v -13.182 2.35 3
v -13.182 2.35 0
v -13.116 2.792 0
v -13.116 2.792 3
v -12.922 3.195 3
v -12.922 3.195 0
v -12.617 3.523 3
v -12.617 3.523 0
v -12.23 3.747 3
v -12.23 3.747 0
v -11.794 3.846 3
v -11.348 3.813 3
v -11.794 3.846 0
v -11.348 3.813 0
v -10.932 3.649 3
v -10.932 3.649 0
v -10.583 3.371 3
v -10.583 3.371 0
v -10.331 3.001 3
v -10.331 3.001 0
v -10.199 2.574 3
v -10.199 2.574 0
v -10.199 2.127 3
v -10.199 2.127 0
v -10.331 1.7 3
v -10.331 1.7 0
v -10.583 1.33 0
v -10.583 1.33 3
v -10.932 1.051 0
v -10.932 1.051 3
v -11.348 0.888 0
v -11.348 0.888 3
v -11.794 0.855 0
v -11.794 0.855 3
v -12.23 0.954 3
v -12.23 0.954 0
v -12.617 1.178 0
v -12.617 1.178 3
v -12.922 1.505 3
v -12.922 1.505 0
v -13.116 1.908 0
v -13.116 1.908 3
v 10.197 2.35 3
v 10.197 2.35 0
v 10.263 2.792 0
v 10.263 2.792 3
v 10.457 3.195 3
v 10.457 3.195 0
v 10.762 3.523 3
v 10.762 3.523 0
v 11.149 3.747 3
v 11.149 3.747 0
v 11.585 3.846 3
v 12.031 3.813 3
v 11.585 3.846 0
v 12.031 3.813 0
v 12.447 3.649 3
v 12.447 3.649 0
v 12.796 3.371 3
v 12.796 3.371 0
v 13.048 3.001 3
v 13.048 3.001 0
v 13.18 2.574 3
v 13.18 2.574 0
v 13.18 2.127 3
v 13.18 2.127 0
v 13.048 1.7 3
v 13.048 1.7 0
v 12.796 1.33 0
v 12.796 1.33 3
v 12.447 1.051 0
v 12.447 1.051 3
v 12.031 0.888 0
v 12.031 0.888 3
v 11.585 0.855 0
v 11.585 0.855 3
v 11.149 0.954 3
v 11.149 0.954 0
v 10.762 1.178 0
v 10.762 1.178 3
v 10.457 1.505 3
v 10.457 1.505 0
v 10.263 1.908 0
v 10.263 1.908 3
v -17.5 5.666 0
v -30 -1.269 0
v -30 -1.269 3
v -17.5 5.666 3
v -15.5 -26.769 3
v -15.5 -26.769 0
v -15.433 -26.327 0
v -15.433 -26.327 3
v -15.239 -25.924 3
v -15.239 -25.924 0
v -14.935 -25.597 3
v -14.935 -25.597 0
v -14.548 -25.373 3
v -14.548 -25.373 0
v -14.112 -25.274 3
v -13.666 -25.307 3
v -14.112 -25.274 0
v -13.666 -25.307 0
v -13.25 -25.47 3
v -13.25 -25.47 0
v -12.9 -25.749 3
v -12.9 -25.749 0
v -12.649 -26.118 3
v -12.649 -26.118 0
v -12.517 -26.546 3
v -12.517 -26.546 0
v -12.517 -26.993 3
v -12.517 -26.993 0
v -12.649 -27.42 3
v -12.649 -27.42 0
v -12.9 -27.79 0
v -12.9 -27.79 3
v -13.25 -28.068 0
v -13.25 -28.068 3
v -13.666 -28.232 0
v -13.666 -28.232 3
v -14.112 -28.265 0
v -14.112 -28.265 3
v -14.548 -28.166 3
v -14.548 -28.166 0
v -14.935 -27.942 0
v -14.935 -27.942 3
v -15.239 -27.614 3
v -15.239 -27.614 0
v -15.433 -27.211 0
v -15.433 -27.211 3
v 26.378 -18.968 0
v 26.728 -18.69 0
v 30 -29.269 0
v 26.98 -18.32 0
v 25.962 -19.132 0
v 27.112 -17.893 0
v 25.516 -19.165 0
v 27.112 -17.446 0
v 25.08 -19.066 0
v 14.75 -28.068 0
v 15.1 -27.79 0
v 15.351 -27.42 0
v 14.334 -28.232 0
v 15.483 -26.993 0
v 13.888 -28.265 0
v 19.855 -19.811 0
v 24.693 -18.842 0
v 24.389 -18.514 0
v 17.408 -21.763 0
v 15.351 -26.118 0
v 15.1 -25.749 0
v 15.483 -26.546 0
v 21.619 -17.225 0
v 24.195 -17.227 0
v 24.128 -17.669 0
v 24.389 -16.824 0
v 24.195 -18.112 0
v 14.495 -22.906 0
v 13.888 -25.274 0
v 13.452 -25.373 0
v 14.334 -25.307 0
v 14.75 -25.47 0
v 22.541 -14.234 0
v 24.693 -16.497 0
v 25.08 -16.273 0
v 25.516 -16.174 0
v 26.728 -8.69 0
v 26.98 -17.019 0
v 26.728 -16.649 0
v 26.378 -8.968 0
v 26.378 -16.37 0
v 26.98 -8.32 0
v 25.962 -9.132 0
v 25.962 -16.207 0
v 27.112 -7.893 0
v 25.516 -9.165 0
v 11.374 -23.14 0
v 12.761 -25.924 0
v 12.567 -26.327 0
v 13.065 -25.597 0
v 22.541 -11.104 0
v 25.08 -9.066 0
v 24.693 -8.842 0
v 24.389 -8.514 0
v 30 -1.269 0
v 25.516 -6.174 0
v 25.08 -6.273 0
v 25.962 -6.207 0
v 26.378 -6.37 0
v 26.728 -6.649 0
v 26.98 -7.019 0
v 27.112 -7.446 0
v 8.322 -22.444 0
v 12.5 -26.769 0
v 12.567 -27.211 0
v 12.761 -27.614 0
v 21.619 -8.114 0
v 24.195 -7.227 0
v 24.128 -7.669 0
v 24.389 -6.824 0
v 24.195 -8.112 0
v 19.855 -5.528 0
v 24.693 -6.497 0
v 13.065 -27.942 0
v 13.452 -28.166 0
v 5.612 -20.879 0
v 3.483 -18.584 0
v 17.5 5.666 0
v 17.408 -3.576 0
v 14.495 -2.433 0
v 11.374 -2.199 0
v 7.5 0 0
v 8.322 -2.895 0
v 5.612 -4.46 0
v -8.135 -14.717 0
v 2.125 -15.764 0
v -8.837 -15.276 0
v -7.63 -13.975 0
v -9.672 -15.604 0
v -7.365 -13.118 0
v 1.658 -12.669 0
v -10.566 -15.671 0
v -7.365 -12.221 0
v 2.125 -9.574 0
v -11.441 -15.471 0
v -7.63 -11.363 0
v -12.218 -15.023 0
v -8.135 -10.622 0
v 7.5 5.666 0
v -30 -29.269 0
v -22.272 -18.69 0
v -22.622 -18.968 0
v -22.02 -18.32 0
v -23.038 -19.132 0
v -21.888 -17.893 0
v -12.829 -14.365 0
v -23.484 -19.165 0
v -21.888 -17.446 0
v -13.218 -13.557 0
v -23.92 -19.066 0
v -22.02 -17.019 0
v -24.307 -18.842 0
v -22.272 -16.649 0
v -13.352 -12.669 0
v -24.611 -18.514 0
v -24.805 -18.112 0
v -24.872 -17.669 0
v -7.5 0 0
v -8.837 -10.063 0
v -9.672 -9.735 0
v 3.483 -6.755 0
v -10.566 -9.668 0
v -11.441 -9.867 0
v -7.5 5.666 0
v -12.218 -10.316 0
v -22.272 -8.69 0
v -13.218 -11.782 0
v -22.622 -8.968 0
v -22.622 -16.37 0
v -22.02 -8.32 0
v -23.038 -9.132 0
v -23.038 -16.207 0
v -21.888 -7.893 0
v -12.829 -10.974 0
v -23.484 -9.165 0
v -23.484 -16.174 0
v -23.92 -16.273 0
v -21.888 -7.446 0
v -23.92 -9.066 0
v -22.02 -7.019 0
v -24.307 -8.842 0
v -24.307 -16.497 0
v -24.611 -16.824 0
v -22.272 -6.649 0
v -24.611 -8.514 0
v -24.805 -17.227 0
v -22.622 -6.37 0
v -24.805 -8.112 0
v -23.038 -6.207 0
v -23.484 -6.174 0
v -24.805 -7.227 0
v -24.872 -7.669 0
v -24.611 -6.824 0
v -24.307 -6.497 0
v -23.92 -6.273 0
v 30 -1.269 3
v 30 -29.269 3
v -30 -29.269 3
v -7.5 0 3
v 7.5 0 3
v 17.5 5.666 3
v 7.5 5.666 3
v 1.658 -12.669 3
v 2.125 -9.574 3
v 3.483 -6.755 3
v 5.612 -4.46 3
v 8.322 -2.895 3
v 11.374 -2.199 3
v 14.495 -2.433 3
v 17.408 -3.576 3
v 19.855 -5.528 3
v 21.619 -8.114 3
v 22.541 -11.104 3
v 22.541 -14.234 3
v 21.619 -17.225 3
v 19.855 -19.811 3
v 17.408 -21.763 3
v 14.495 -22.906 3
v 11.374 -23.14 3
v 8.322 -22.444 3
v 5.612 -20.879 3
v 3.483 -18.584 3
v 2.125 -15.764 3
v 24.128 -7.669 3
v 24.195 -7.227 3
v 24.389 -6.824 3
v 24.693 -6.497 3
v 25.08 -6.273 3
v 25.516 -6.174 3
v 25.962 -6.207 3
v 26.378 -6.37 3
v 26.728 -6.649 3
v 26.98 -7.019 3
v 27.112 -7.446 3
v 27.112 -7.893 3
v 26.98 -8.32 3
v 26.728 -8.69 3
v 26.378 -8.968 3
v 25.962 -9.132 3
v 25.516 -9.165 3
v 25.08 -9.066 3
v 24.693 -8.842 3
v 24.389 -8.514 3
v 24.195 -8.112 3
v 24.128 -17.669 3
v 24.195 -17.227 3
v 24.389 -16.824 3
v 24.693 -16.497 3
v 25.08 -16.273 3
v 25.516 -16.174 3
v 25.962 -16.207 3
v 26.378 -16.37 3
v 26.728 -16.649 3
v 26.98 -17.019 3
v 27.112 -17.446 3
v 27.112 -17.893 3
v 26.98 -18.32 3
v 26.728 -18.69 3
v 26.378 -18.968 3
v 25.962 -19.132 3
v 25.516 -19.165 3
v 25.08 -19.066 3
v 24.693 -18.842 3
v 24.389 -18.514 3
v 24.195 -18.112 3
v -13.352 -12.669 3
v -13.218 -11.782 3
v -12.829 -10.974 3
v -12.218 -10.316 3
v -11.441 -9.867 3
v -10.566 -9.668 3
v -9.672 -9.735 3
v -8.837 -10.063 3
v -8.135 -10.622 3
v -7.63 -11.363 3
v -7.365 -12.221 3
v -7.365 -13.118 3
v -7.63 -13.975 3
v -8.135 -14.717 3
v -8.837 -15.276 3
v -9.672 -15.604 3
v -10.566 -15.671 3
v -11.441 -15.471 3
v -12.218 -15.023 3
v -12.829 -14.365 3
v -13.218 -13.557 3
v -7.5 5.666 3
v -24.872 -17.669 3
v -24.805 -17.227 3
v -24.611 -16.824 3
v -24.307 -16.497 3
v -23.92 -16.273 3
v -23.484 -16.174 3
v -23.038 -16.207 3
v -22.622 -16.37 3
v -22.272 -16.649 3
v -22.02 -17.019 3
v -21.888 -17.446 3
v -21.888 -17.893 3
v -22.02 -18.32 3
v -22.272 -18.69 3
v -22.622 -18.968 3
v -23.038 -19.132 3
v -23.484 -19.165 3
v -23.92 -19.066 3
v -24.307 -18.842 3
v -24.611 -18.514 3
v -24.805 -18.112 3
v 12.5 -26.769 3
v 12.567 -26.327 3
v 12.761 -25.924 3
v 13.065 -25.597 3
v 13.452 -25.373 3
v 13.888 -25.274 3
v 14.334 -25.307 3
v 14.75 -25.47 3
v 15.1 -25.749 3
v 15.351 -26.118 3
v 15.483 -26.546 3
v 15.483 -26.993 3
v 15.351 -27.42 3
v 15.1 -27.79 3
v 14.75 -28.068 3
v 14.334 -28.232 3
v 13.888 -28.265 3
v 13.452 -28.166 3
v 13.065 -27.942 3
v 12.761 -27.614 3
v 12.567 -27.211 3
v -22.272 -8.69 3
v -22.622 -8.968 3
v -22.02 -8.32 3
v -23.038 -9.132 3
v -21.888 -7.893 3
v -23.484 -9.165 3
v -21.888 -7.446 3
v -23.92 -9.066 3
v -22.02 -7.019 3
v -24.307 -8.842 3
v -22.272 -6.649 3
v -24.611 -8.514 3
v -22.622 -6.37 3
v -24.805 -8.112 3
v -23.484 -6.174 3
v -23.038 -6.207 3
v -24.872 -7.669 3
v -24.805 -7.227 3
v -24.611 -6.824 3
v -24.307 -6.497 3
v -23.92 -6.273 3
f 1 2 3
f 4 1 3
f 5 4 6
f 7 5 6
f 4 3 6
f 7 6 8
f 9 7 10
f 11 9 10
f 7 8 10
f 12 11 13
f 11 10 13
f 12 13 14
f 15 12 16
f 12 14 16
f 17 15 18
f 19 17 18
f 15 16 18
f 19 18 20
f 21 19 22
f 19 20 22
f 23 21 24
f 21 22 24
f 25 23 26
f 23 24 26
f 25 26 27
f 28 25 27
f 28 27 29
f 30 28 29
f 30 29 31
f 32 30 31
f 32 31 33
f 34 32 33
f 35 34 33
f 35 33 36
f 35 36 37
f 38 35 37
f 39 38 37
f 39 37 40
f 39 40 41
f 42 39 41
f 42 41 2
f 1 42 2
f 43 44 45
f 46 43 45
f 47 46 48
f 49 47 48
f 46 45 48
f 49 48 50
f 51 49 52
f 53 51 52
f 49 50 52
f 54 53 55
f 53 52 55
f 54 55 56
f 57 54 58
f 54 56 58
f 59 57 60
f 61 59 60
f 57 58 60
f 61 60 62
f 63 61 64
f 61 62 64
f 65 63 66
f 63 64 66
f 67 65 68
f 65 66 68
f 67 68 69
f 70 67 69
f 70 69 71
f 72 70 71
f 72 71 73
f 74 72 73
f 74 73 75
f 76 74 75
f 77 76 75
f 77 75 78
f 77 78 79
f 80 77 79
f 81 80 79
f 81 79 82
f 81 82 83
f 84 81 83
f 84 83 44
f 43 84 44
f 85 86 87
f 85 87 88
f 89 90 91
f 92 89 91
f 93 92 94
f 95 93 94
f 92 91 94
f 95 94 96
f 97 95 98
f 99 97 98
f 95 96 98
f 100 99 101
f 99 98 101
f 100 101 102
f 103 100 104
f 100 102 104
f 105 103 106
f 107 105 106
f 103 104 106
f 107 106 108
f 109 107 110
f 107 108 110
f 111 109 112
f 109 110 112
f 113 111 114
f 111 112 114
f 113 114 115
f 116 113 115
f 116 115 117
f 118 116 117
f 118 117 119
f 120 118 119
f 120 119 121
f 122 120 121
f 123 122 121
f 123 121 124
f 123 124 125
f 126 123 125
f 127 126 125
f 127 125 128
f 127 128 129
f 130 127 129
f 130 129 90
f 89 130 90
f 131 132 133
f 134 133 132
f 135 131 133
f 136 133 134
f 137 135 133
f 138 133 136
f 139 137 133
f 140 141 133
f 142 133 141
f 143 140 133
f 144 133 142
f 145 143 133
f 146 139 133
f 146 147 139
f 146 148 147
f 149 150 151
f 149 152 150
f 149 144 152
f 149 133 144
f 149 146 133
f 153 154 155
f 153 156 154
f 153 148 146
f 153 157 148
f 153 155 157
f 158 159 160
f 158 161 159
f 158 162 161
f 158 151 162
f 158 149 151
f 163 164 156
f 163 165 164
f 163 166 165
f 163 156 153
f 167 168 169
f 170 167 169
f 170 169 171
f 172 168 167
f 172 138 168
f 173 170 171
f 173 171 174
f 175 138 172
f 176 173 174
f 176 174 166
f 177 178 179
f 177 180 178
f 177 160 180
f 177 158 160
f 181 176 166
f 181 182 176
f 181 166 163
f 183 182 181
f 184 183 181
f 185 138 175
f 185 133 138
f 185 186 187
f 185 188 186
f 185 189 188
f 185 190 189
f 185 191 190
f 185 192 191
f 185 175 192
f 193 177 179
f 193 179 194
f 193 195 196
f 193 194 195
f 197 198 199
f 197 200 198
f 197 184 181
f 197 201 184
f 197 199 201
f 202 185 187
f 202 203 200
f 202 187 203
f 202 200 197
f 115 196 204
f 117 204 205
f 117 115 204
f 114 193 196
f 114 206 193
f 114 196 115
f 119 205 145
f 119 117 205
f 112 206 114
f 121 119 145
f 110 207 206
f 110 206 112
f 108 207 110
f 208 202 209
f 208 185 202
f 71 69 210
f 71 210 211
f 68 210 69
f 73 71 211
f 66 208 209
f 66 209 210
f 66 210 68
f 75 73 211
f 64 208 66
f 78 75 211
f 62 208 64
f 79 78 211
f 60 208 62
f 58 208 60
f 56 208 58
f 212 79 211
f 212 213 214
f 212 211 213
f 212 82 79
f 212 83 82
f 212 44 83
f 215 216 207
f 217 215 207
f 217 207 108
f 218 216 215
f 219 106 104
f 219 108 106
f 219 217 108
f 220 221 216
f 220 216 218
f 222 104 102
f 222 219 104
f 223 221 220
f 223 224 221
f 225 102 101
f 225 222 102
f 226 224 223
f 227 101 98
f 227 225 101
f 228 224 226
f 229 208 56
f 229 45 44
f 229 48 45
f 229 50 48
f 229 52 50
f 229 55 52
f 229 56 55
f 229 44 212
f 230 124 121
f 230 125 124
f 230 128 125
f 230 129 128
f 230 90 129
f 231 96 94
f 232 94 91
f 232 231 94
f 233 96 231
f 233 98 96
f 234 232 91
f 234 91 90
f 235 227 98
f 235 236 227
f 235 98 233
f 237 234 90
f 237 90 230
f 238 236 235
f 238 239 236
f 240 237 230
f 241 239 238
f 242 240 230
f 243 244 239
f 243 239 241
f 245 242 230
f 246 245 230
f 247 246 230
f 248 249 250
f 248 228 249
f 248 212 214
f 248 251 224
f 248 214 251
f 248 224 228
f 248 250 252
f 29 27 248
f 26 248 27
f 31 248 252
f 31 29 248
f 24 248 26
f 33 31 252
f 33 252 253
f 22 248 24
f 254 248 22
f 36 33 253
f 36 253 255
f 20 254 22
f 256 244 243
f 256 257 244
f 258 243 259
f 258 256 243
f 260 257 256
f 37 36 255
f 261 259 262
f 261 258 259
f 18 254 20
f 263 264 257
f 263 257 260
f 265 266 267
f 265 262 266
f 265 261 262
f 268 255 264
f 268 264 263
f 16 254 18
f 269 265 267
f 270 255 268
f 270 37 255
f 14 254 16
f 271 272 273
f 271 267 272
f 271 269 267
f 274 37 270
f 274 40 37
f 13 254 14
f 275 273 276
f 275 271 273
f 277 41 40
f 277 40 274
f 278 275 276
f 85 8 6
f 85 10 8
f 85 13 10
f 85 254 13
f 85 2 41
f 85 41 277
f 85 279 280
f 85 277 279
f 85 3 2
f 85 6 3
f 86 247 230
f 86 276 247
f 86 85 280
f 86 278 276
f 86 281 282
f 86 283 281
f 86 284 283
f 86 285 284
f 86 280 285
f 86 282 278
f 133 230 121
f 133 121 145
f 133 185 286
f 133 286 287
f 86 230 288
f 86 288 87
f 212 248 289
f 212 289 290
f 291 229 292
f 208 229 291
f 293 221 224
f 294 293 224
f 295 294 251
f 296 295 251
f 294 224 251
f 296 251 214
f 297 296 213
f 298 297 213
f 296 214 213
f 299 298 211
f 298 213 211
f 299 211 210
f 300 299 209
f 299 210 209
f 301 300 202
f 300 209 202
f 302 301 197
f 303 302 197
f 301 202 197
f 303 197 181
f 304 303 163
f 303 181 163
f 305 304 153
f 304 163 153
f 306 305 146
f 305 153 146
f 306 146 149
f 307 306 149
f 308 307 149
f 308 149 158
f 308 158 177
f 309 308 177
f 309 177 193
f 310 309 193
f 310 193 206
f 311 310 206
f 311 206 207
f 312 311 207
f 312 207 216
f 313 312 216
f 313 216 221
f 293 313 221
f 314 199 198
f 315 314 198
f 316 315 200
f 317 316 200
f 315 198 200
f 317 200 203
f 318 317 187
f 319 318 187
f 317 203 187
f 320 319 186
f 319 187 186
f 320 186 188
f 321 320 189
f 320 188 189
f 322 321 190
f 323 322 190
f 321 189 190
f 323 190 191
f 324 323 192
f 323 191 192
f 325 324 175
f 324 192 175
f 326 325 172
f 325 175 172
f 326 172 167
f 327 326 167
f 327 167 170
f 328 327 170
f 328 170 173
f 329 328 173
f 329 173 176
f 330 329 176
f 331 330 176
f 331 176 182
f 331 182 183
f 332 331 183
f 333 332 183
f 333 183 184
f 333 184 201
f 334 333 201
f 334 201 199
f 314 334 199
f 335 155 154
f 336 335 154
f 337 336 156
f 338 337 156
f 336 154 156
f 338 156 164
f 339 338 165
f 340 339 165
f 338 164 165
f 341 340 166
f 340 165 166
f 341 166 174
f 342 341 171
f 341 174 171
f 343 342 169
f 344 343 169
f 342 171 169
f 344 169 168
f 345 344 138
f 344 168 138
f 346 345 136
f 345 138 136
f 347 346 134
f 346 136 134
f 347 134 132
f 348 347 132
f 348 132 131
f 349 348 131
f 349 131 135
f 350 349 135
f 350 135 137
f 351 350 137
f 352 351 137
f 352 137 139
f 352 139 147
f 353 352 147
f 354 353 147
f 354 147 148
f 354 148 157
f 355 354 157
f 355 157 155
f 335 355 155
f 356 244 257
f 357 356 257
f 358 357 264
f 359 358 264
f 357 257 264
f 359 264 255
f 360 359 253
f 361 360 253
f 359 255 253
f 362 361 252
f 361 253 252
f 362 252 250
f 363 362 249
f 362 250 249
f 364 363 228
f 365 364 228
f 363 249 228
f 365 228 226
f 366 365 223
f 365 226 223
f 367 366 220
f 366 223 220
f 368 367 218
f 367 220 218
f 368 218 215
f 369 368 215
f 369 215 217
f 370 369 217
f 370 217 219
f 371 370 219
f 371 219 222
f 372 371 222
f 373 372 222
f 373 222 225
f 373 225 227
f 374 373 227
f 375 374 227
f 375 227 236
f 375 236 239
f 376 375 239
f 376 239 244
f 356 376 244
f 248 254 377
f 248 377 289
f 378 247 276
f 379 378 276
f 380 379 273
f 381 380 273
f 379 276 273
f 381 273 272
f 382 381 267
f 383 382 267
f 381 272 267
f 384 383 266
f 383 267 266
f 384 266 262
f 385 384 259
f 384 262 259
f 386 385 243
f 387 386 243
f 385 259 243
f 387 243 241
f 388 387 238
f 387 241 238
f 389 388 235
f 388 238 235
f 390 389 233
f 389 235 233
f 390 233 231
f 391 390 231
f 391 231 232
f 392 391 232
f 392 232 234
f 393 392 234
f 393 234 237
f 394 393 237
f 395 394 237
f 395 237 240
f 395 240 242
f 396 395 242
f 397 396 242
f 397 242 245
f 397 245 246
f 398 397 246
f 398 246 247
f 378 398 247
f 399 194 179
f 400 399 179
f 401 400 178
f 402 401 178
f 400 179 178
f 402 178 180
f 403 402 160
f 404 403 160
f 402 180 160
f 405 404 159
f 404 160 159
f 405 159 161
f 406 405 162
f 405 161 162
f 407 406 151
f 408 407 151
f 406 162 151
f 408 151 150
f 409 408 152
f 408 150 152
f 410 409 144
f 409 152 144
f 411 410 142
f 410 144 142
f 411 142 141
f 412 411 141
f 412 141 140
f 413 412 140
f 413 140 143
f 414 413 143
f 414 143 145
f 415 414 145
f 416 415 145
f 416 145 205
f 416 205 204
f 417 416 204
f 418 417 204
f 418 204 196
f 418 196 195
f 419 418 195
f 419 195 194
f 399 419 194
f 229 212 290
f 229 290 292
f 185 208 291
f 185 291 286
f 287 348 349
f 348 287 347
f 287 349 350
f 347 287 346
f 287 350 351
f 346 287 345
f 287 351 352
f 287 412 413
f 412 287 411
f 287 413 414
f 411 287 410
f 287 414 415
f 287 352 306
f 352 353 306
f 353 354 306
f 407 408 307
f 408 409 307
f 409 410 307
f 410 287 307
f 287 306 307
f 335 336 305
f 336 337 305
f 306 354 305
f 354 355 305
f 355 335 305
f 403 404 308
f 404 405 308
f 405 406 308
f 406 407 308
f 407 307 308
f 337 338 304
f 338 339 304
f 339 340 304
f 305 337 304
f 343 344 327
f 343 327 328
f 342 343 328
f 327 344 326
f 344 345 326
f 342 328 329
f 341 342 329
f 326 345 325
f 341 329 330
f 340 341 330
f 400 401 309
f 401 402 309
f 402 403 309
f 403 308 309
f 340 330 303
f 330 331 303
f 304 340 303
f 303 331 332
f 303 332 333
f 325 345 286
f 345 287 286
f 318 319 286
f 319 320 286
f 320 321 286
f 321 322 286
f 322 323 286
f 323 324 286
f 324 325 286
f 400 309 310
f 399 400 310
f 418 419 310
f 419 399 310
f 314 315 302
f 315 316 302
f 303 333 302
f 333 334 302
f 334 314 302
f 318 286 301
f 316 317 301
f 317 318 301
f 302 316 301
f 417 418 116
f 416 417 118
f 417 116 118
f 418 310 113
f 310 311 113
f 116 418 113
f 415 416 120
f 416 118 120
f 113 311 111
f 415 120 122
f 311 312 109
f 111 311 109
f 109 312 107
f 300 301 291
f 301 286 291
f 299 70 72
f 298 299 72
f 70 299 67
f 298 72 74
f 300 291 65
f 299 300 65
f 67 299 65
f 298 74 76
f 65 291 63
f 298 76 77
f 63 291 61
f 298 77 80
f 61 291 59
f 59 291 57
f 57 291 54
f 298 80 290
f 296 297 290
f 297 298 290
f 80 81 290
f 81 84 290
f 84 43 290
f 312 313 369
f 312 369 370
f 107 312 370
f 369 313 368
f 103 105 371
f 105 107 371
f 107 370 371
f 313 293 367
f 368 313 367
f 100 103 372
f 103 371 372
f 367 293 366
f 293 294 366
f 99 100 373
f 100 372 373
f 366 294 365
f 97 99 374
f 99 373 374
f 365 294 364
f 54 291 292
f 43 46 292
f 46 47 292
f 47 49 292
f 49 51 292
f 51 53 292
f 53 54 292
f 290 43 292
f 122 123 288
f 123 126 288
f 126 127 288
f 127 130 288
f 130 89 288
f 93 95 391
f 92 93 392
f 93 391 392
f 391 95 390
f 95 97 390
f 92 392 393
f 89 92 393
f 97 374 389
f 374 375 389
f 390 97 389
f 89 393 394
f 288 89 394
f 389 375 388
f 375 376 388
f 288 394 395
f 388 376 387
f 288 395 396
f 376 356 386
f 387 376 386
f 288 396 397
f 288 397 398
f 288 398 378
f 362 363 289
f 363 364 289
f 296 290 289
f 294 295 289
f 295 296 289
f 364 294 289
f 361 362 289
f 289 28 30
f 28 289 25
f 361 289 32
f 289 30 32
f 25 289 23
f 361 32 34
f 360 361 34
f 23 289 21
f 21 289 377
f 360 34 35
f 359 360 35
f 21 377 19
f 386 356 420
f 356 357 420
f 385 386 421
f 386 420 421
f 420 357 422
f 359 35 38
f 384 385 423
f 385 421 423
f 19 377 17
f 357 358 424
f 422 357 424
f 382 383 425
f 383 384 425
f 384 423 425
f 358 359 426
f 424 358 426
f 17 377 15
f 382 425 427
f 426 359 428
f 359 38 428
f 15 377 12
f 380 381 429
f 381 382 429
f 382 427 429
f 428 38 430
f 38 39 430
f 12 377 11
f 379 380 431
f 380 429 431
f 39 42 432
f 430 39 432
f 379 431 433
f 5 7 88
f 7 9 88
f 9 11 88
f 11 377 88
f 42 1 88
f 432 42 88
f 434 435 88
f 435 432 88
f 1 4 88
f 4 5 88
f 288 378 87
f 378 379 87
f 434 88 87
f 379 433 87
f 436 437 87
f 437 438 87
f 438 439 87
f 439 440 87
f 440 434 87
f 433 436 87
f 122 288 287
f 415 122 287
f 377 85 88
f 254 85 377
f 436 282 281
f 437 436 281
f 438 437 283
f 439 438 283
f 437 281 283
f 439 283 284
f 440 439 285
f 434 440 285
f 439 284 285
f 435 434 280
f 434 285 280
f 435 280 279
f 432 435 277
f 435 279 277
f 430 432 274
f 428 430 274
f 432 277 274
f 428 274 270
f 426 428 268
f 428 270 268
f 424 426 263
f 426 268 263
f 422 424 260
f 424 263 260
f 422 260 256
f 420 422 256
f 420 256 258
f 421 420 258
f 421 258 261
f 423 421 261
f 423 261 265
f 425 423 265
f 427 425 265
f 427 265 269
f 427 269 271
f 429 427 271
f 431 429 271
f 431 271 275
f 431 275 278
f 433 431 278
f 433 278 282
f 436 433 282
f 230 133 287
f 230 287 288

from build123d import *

# Parameters (mm, degrees)
EXTRUDE_1_DEPTH      = 3
SKETCH_2_R           = 1.5
CUT_EXTRUDE_7_DEPTH  = 43.02014847
SKETCH_4_R           = 1.5
CUT_EXTRUDE_8_DEPTH  = 43.02014847
SKETCH_6_R           = 10.5
SKETCH_6_R_2         = 3.01
CUT_EXTRUDE_9_DEPTH  = 43.02014847
SKETCH_7_R           = 1.5
CUT_EXTRUDE_10_DEPTH = 43.02014847


with BuildPart() as part:
    # 草图1 → 凸台-拉伸1 (new body)
    with BuildSketch(Plane.XY):
        Polygon((-7.5, 0), (7.5, 0), (7.5, 5.665837688), (17.5, 5.665837688), (30, -1.269316313), (30, -29.269316313), (-30, -29.269316313), (-30, -1.269316313), (-17.5, 5.665837688), (-7.5, 5.665837688), align=None)
    extrude(amount=EXTRUDE_1_DEPTH)

    # 草图2 → 切除-拉伸7 (cut, through all)
    with BuildSketch(Plane(origin=(0, 0, 0), x_dir=(-1, 0, 0), z_dir=(0, 0, -1))):
        with Locations((-25.62844718, -17.669380188)):
            Circle(SKETCH_2_R)
        with Locations((-25.62844718, -7.669380188)):
            Circle(SKETCH_2_R)
        with Locations((23.37155282, -17.669380188)):
            Circle(SKETCH_2_R)
        with Locations((23.37155282, -7.669380188)):
            Circle(SKETCH_2_R)
    extrude(amount=-CUT_EXTRUDE_7_DEPTH, mode=Mode.SUBTRACT)

    # 草图4 → 切除-拉伸8 (cut, through all)
    with BuildSketch(Plane(origin=(0, 0, 0), x_dir=(-1, 0, 0), z_dir=(0, 0, -1))):
        with Locations((-11.696832964, 2.350343297)):
            Circle(SKETCH_4_R)
        with Locations((11.682164636, 2.350343297)):
            Circle(SKETCH_4_R)
    extrude(amount=-CUT_EXTRUDE_8_DEPTH, mode=Mode.SUBTRACT)

    # 草图6 → 切除-拉伸9 (cut, through all)
    with BuildSketch(Plane(origin=(0, 0, 0), x_dir=(-1, 0, 0), z_dir=(0, 0, -1))):
        with Locations((-12.15844718, -12.669380188)):
            Circle(SKETCH_6_R)
        with Locations((10.34155282, -12.669316313)):
            Circle(SKETCH_6_R_2)
    extrude(amount=-CUT_EXTRUDE_9_DEPTH, mode=Mode.SUBTRACT)

    # 草图7 → 切除-拉伸10 (cut, through all)
    with BuildSketch(Plane(origin=(0, 0, 0), x_dir=(-1, 0, 0), z_dir=(0, 0, -1))):
        with Locations((14, -26.769316313)):
            Circle(SKETCH_7_R)
        with Locations((-14, -26.769316313)):
            Circle(SKETCH_7_R)
    extrude(amount=-CUT_EXTRUDE_10_DEPTH, mode=Mode.SUBTRACT)


solid = part.part
